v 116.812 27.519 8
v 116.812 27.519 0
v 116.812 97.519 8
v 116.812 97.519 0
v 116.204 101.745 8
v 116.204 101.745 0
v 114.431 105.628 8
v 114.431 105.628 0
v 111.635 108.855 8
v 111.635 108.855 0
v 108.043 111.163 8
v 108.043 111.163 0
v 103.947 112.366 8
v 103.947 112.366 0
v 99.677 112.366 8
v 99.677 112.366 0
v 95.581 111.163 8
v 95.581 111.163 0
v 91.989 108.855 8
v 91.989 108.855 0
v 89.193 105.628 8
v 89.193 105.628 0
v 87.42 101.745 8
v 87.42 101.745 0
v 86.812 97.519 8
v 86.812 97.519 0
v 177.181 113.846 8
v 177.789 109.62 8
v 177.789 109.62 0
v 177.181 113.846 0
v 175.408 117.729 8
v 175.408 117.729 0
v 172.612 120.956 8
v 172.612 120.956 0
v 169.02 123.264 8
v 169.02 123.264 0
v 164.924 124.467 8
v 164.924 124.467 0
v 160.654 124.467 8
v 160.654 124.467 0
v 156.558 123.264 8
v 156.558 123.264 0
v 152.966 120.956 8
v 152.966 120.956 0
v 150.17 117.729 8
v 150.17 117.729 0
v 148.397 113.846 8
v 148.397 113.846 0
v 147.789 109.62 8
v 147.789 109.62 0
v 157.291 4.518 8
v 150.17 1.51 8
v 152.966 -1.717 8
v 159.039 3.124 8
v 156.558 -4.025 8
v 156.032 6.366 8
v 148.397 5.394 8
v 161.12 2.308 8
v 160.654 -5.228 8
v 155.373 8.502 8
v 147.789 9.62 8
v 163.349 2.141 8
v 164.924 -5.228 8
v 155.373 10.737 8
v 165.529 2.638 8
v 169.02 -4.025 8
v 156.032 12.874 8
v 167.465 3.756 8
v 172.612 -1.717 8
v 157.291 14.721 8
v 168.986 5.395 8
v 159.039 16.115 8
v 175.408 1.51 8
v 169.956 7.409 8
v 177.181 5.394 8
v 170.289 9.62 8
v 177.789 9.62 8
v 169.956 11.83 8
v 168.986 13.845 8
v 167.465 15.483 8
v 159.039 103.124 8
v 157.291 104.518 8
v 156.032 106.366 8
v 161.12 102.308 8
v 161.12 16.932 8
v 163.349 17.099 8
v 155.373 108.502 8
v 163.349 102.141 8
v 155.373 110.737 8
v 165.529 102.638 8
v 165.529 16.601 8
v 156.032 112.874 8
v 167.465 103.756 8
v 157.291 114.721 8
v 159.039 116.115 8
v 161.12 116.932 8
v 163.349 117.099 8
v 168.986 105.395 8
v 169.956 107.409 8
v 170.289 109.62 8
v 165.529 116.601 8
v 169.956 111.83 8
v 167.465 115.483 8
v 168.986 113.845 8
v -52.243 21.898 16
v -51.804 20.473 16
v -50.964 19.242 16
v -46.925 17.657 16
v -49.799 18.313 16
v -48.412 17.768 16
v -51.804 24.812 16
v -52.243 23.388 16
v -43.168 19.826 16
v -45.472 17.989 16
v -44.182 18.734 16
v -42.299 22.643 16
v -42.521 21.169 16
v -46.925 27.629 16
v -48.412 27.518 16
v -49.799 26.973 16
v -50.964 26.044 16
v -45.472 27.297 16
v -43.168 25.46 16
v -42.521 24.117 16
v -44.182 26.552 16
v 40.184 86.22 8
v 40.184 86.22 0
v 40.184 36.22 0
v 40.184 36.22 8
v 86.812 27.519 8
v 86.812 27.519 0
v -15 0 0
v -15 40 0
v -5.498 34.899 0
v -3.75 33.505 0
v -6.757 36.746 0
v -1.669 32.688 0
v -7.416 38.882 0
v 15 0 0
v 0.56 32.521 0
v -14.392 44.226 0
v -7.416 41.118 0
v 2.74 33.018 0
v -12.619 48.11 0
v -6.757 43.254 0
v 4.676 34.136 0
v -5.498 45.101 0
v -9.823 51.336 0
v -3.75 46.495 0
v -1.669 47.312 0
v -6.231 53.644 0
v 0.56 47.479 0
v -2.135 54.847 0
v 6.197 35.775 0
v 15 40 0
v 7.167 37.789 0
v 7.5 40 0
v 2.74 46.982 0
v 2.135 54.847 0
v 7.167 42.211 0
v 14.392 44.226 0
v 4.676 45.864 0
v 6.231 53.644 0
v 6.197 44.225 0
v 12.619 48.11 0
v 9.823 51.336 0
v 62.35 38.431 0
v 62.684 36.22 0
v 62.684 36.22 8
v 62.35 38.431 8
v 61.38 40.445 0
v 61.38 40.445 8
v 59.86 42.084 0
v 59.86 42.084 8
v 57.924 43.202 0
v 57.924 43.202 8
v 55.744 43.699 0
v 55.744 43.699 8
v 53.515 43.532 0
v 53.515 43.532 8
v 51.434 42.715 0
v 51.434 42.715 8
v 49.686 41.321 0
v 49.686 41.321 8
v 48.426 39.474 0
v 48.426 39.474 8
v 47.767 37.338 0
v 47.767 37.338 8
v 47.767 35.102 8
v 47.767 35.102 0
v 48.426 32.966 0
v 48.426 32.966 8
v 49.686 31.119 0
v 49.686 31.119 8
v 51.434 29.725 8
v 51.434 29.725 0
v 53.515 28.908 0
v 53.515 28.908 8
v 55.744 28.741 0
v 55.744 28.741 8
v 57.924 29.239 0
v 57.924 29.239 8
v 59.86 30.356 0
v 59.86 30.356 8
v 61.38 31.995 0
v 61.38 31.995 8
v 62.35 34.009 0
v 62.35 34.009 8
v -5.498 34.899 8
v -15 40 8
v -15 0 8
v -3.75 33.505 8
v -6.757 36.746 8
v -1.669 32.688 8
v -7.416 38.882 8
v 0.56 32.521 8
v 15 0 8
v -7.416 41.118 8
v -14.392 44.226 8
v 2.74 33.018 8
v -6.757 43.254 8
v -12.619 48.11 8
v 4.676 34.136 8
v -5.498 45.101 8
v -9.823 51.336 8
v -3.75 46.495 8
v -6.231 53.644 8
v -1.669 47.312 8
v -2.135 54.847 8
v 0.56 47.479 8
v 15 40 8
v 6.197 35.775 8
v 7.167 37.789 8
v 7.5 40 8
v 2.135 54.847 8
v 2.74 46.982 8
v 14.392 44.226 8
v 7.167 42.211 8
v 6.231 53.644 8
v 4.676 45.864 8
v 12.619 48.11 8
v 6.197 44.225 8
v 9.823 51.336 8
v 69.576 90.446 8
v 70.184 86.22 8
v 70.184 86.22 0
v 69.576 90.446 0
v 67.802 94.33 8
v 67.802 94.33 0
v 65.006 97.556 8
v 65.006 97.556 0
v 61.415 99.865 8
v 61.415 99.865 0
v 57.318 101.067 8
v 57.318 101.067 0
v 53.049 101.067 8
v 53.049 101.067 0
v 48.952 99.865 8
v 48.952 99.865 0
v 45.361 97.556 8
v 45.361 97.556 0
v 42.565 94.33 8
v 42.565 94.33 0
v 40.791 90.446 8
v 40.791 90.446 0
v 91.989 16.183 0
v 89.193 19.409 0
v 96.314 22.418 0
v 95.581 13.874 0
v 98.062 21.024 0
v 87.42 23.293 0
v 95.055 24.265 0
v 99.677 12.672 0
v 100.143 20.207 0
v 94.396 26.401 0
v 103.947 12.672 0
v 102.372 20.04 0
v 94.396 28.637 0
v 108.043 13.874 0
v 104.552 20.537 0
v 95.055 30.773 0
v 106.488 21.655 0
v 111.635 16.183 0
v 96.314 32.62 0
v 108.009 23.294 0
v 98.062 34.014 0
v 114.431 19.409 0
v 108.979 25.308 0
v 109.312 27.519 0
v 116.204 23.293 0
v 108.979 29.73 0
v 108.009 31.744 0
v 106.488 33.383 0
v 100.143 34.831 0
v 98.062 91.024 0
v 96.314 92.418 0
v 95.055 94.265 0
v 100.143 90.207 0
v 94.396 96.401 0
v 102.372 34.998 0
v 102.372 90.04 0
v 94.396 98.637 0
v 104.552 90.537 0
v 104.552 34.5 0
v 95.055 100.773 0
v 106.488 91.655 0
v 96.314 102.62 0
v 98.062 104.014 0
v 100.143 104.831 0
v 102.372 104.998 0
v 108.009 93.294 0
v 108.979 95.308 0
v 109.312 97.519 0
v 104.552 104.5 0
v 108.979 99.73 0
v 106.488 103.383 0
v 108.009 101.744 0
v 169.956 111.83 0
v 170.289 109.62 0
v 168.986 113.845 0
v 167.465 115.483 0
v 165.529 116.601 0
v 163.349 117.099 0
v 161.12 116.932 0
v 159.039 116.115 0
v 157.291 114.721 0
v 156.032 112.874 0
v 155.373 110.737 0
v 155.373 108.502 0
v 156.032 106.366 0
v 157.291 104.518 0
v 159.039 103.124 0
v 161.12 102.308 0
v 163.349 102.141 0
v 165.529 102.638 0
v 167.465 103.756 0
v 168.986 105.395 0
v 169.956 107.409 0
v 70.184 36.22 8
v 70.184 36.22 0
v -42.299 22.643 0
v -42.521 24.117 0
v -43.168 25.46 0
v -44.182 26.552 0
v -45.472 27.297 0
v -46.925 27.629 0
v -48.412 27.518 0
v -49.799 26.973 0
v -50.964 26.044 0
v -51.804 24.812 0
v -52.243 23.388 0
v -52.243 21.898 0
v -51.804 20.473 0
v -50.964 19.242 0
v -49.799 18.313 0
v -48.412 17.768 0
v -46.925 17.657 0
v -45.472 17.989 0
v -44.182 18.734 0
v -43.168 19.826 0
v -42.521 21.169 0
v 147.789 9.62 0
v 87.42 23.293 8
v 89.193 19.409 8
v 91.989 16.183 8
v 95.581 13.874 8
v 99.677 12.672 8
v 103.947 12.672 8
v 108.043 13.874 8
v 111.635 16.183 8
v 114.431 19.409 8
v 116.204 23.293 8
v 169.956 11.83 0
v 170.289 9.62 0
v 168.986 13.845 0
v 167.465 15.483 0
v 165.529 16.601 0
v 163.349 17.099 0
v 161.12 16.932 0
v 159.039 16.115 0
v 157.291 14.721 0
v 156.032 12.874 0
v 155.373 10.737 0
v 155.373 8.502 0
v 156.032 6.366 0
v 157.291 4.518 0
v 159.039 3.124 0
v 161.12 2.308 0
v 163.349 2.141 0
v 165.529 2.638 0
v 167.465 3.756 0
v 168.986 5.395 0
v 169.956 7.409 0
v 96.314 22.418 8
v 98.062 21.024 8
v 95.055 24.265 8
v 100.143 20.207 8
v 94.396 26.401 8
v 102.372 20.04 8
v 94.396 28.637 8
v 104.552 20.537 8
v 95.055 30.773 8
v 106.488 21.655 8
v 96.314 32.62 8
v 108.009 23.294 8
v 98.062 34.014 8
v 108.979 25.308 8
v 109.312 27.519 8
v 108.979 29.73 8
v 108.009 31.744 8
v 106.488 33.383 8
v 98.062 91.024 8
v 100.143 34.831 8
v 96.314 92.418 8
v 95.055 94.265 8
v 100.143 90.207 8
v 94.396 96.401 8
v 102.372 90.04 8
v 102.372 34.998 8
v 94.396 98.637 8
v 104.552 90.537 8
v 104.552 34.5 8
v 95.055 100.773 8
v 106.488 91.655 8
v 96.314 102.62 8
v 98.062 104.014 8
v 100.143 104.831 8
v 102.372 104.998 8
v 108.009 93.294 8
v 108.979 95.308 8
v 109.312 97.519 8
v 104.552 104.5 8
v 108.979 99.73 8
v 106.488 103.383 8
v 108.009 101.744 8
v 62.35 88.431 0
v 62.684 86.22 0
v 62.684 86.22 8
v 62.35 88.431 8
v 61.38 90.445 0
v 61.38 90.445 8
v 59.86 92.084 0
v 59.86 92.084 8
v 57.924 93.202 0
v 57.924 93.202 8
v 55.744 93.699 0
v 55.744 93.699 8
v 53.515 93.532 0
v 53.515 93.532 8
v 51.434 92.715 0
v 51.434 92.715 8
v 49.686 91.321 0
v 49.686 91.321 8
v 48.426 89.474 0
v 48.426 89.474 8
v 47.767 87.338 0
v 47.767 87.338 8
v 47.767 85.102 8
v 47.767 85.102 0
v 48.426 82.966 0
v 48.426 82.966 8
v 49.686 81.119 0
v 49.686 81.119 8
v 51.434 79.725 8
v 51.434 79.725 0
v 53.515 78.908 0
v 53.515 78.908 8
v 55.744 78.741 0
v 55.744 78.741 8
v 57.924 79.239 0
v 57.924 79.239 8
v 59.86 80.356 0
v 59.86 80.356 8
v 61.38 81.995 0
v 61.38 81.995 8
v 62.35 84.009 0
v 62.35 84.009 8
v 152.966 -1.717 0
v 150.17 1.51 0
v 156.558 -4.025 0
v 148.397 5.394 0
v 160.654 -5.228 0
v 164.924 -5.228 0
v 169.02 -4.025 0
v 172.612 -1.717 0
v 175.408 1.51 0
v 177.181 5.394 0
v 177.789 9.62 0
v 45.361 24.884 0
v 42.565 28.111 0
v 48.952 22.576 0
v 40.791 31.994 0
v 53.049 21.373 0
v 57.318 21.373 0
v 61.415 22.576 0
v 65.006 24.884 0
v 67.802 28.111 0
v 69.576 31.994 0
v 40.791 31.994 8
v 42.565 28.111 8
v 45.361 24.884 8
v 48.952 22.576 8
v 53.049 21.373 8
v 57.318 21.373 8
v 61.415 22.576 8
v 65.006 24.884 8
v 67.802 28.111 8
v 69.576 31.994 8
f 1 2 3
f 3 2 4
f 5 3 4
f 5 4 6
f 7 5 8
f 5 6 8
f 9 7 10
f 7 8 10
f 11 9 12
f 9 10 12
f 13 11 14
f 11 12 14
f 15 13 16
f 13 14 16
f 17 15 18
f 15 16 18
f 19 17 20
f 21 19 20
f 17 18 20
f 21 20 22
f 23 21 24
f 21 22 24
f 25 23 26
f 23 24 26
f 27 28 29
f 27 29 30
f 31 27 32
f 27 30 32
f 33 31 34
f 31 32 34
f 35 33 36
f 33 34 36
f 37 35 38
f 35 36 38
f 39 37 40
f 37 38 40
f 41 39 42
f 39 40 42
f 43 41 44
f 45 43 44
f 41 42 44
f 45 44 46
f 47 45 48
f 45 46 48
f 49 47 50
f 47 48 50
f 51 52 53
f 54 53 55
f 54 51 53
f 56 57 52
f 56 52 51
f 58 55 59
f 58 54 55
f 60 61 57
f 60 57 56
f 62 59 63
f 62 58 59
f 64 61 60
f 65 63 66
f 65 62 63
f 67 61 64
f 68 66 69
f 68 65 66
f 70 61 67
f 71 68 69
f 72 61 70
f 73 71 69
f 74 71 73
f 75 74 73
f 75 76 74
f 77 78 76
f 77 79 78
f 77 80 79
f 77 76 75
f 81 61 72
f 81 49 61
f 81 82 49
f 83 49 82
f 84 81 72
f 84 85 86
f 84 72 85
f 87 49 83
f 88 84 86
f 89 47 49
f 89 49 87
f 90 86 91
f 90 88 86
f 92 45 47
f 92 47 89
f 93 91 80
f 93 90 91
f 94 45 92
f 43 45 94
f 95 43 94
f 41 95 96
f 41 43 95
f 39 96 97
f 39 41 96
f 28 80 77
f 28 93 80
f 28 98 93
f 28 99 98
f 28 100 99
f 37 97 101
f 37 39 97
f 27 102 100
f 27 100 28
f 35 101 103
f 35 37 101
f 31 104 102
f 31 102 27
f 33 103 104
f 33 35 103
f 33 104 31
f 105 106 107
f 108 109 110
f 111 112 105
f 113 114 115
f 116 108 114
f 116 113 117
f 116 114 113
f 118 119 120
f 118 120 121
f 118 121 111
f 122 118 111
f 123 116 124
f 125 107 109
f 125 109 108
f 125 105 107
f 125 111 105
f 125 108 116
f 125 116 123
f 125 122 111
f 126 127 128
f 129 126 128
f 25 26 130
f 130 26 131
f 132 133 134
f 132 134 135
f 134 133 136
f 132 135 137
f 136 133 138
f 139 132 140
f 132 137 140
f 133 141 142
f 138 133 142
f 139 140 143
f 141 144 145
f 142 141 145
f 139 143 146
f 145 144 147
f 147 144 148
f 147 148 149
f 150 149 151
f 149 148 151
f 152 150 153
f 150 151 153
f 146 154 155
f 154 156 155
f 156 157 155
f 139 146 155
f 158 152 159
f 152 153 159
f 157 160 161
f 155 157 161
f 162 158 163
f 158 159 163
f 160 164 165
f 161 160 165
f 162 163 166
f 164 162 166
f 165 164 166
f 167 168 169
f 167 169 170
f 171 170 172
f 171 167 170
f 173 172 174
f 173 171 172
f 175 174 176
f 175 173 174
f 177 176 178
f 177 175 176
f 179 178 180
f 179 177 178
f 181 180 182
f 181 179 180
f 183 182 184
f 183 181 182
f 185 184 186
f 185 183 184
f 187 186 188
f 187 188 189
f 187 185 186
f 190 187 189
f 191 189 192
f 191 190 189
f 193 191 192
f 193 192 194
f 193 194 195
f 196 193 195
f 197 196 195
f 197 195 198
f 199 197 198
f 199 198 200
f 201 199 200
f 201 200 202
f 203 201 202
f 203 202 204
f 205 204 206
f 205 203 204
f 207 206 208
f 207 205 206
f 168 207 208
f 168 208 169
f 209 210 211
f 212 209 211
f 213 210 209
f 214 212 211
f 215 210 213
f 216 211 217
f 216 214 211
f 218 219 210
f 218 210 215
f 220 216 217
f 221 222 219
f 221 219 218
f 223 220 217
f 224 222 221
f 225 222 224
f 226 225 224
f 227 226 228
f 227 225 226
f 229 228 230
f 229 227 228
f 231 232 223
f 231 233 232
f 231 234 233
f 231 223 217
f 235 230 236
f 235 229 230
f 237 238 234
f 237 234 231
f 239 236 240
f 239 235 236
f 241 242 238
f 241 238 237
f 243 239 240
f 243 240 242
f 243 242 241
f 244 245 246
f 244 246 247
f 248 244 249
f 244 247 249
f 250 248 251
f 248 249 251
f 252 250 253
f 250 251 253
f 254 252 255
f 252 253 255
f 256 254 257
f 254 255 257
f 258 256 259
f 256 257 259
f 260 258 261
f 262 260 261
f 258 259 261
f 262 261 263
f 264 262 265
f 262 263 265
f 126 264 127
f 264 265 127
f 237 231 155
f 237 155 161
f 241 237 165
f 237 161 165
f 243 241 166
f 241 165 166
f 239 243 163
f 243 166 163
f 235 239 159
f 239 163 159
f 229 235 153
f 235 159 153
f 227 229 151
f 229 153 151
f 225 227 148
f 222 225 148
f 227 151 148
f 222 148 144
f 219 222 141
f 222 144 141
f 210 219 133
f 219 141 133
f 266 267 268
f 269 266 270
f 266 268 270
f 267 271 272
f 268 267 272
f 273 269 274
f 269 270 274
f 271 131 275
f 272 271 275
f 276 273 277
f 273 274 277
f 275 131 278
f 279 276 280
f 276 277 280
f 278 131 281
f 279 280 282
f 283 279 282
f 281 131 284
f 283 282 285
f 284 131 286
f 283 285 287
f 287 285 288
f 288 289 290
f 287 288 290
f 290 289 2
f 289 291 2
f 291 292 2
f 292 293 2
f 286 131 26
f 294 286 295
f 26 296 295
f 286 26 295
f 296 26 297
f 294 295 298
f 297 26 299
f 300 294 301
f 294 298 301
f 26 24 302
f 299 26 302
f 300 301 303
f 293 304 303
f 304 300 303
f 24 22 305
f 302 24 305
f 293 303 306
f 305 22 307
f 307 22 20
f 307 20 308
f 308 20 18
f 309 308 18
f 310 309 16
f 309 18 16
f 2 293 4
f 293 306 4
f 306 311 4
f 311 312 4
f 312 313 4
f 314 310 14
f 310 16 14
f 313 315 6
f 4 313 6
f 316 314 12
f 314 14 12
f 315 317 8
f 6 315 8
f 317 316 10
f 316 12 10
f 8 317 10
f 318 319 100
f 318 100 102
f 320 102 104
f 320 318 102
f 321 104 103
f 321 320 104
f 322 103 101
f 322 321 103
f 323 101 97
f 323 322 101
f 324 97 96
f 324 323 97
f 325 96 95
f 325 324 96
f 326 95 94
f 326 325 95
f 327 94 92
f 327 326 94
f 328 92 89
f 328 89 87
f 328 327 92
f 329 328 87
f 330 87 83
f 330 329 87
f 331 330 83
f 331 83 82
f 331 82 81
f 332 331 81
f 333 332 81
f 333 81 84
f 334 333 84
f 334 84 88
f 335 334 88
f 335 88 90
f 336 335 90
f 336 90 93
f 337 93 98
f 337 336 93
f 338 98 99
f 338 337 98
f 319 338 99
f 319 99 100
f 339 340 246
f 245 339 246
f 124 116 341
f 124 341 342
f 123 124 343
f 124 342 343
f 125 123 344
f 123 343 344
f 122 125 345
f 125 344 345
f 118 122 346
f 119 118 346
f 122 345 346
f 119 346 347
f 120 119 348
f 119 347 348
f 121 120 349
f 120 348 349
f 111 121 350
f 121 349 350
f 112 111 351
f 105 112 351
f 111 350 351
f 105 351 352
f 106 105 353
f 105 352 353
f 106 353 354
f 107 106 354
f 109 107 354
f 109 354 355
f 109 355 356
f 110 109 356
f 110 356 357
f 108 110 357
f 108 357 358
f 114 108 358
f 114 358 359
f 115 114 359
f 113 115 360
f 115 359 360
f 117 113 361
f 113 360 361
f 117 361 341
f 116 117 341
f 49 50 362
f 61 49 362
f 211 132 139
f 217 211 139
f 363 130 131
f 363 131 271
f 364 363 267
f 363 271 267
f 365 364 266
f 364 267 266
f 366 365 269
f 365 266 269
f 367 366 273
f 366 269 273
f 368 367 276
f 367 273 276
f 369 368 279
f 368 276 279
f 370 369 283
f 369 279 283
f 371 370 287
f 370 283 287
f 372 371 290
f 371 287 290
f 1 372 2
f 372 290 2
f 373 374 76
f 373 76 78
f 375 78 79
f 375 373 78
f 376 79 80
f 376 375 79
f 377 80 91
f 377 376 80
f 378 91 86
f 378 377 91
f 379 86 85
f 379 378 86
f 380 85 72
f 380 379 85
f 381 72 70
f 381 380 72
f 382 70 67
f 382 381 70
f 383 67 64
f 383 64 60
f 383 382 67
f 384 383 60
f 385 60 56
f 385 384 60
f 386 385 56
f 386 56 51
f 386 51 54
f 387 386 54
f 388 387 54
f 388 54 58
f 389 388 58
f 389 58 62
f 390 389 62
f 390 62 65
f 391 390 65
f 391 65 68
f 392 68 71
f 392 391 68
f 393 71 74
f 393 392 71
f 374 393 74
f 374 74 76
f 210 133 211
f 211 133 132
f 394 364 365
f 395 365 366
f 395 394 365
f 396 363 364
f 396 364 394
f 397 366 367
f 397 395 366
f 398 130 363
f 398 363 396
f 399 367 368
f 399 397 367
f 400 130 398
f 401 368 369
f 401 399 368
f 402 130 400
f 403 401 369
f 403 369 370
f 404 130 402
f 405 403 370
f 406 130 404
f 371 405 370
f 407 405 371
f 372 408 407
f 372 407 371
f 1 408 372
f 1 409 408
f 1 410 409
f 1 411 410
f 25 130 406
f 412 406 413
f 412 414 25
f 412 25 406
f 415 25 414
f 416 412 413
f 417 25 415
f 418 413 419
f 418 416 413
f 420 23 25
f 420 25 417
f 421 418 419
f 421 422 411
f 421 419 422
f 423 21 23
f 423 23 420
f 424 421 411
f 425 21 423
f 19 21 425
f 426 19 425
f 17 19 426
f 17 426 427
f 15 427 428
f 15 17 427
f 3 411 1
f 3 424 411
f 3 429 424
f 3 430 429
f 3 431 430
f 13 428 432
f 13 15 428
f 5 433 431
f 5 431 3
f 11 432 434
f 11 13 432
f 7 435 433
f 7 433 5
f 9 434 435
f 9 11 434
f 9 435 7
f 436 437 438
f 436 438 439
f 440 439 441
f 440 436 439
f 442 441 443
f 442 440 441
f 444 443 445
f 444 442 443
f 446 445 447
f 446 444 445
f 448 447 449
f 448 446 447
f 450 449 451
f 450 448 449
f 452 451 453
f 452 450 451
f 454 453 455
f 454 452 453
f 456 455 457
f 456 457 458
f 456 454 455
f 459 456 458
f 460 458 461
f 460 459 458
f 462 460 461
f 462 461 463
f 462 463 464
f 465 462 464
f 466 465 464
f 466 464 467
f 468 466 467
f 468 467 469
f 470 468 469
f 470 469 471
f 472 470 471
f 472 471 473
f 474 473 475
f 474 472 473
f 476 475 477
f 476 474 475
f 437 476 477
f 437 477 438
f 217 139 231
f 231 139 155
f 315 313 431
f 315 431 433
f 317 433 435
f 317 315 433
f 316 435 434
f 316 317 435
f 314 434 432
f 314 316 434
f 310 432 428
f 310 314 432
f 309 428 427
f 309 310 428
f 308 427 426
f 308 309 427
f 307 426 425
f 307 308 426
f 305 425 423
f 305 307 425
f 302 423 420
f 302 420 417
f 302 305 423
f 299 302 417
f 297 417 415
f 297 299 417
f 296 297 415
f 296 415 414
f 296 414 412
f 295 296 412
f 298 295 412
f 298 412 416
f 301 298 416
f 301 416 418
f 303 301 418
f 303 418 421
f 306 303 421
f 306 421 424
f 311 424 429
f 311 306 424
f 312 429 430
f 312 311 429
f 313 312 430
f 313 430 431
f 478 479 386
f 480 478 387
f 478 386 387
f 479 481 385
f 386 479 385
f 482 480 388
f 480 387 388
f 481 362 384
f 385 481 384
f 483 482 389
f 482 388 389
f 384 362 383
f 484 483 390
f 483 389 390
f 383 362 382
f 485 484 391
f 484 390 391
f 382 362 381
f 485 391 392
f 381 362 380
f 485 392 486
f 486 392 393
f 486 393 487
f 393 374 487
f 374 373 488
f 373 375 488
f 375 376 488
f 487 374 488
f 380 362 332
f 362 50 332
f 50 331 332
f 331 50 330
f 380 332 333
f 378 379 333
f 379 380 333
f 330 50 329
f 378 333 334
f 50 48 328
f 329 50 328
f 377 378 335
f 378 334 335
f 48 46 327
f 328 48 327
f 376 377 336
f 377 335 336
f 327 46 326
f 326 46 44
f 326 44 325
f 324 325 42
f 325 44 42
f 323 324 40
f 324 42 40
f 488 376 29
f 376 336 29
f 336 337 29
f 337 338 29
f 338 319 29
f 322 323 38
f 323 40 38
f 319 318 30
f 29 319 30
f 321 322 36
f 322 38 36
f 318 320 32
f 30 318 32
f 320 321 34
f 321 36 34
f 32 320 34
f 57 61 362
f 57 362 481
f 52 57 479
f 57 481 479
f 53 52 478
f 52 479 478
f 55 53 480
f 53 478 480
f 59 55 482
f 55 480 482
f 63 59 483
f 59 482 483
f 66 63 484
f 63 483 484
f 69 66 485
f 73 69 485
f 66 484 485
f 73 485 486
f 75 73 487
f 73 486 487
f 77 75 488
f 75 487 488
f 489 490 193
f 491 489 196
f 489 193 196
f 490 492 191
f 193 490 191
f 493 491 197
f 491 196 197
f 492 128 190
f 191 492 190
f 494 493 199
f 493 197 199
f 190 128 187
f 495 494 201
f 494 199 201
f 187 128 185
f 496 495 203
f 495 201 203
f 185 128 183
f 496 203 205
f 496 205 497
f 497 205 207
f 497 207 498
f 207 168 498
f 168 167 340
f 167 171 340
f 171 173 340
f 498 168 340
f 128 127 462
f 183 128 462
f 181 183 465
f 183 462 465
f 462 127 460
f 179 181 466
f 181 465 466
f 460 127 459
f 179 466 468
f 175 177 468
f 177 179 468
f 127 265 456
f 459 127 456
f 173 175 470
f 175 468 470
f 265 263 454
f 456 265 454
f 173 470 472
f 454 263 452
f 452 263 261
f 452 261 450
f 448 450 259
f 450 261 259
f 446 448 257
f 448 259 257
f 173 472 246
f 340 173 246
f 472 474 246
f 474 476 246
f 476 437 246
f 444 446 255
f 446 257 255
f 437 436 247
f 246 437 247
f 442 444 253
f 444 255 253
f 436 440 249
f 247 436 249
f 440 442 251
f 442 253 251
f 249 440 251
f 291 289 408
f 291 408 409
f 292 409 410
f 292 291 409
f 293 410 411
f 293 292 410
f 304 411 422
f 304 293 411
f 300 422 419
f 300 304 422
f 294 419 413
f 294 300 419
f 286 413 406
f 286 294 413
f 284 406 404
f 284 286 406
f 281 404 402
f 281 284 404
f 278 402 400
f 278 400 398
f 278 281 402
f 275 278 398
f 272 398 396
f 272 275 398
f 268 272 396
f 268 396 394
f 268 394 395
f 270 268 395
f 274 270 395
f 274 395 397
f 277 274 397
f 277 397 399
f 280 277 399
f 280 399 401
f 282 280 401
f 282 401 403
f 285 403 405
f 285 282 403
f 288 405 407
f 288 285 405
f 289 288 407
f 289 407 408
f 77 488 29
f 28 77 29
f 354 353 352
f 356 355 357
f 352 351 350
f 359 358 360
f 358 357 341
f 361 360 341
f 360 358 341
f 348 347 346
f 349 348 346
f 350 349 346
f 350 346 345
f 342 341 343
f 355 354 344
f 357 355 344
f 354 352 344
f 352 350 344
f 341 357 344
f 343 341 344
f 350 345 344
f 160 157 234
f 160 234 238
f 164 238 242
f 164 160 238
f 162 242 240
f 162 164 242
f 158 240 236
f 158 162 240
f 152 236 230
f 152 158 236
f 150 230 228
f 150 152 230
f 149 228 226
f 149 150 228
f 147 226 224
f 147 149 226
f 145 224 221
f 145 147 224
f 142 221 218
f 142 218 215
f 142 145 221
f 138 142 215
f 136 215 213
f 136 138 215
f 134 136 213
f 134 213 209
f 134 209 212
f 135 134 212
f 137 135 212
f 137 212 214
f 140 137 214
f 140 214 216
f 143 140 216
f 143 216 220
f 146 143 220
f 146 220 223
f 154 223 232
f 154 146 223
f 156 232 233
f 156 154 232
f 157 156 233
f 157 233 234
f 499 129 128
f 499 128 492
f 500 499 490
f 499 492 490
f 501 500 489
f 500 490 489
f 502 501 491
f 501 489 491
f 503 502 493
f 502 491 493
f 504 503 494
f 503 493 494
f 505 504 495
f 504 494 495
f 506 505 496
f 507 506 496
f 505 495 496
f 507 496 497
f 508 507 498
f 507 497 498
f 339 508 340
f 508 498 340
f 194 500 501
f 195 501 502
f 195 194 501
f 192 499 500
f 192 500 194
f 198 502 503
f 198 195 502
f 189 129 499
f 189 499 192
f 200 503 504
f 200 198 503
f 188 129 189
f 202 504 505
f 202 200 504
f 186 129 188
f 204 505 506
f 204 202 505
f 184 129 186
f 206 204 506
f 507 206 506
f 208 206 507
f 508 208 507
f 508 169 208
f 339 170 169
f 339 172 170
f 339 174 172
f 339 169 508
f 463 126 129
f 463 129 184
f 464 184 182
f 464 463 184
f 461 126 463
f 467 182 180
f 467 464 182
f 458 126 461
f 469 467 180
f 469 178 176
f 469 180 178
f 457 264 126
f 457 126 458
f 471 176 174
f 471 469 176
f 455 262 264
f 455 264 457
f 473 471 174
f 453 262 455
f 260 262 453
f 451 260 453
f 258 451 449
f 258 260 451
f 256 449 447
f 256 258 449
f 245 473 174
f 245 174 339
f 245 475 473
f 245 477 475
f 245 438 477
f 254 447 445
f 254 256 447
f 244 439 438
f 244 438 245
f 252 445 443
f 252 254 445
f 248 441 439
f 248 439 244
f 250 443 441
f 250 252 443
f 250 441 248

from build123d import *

# Parameters (mm, degrees)
F0_R     = 7.5
F1_DEPTH = 8
F2_R     = 7.5
F3_DEPTH = 8
F4_R     = 7.5
F5_DEPTH = 8
F6_R     = 7.5
F7_DEPTH = 8
F8_R     = 5
F9_DEPTH = 16


with BuildPart() as f1:
    # F0 (on Top) → F1 (new body)
    with BuildSketch(Plane.XY):
        with BuildLine():
            Line((15, 0), (15, 40))
            ThreePointArc((15, 40), (0, 55), (-15, 40))
            Line((-15, 40), (-15, 0))
            Line((-15, 0), (15, 0))
        make_face()
        with Locations((0, 40)):
            Circle(F0_R, mode=Mode.SUBTRACT)
    extrude(amount=F1_DEPTH)


with BuildPart() as f3:
    # F2 (on Top) → F3 (new body)
    with BuildSketch(Plane.XY):
        with BuildLine():
            Line((70.183553, 36.220128), (70.183553, 86.220128))
            ThreePointArc((70.183553, 86.220128), (55.183553, 101.220128), (40.183553, 86.220128))
            Line((40.183553, 86.220128), (40.183553, 36.220128))
            ThreePointArc((40.183553, 36.220128), (55.183553, 21.220128), (70.183553, 36.220128))
        make_face()
        with Locations((55.183553, 36.220128)):
            Circle(F2_R, mode=Mode.SUBTRACT)
        with Locations((55.183553, 86.220128)):
            Circle(F2_R, mode=Mode.SUBTRACT)
    extrude(amount=F3_DEPTH)


with BuildPart() as f5:
    # F4 (on Top) → F5 (new body)
    with BuildSketch(Plane.XY):
        with BuildLine():
            Line((86.811931, 97.518846), (86.811931, 27.518846))
            ThreePointArc((86.811931, 27.518846), (101.811931, 12.518846), (116.811931, 27.518846))
            Line((116.811931, 27.518846), (116.811931, 97.518846))
            ThreePointArc((116.811931, 97.518846), (101.811931, 112.518846), (86.811931, 97.518846))
        make_face()
        with Locations((101.811931, 27.518846)):
            Circle(F4_R, mode=Mode.SUBTRACT)
        with Locations((101.811931, 97.518846)):
            Circle(F4_R, mode=Mode.SUBTRACT)
    extrude(amount=F5_DEPTH)


with BuildPart() as f7:
    # F6 (on Top) → F7 (new body)
    with BuildSketch(Plane.XY):
        with BuildLine():
            Line((177.788905, 9.619664), (177.788905, 109.619664))
            ThreePointArc((177.788905, 109.619664), (162.788905, 124.619664), (147.788905, 109.619664))
            Line((147.788905, 109.619664), (147.788905, 9.619664))
            ThreePointArc((147.788905, 9.619664), (162.788905, -5.380336), (177.788905, 9.619664))
        make_face()
        with Locations((162.788905, 9.619664)):
            Circle(F6_R, mode=Mode.SUBTRACT)
        with Locations((162.788905, 109.619664)):
            Circle(F6_R, mode=Mode.SUBTRACT)
    extrude(amount=F7_DEPTH)


with BuildPart() as f9:
    # F8 (on Top) → F9 (new body)
    with BuildSketch(Plane.XY):
        with Locations((-47.299091, 22.642907)):
            Circle(F8_R)
    extrude(amount=F9_DEPTH)


solid = Compound([f1.part, f3.part, f5.part, f7.part, f9.part])
